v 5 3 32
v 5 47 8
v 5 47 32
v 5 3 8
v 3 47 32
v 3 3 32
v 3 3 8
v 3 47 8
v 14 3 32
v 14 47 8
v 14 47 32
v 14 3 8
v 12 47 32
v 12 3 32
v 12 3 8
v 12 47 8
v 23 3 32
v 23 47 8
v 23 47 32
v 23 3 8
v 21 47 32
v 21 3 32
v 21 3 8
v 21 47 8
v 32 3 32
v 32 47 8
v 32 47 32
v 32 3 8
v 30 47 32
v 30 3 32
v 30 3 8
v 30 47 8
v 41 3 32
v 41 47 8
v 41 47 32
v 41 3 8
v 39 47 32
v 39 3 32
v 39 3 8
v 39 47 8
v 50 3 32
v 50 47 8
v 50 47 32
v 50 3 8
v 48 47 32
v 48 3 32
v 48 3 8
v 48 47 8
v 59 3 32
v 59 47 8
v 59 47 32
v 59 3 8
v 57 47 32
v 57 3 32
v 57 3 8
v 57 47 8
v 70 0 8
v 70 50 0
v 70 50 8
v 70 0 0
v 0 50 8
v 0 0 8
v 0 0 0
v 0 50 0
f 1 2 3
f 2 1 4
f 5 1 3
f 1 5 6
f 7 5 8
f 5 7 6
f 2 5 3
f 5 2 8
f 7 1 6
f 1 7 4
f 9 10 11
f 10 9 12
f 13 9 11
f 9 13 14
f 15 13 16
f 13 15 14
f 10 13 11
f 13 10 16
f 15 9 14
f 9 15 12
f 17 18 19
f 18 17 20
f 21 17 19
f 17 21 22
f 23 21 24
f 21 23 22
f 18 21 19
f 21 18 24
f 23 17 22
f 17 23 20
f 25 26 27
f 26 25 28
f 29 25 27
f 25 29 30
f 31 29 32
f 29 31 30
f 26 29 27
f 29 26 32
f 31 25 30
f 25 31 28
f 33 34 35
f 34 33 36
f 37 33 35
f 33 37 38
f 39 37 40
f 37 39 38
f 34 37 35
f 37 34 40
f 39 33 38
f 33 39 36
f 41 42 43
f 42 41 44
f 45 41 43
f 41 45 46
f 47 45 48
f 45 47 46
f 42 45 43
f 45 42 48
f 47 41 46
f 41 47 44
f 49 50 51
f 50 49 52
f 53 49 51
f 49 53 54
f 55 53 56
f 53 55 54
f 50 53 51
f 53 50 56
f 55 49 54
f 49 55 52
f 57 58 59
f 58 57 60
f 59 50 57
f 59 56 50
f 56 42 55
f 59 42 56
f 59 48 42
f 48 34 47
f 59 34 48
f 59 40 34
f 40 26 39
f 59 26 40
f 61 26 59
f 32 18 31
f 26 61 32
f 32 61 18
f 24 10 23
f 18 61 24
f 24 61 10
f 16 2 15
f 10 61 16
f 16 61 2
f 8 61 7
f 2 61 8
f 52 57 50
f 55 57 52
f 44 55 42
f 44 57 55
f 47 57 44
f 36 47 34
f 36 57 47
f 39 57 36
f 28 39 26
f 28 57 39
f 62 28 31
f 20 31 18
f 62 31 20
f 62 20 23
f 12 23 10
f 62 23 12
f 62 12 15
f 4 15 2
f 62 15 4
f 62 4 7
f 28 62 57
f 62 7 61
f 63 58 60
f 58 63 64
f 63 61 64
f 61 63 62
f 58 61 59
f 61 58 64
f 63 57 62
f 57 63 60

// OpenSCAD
$fn = 32;

// ----------------------------------------------------------------------
// Heatsink: uniform fin block
// ----------------------------------------------------------------------

// --- parameters (mm) ---
base_l = 70;              // base length, X
base_w = 50;              // base width, Y
base_t = 8;               // base plate thickness
fin_h = 25;               // fin height above the base
fin_t = 2;                // fin thickness
edge = 3;                 // margin from the base ends
pitch = 9;                // fin pitch

n_fins = floor((base_l - 2 * edge - fin_t) / pitch) + 1;  // fin count
total_h = base_t + fin_h - 1;  // overall height

union() {
  cube([base_l, base_w, base_t]);
  for (i = [0 : n_fins - 1])
    translate([edge + i * pitch, edge, base_t - 1])
      cube([fin_t, base_w - 2 * edge, fin_h]);
}
